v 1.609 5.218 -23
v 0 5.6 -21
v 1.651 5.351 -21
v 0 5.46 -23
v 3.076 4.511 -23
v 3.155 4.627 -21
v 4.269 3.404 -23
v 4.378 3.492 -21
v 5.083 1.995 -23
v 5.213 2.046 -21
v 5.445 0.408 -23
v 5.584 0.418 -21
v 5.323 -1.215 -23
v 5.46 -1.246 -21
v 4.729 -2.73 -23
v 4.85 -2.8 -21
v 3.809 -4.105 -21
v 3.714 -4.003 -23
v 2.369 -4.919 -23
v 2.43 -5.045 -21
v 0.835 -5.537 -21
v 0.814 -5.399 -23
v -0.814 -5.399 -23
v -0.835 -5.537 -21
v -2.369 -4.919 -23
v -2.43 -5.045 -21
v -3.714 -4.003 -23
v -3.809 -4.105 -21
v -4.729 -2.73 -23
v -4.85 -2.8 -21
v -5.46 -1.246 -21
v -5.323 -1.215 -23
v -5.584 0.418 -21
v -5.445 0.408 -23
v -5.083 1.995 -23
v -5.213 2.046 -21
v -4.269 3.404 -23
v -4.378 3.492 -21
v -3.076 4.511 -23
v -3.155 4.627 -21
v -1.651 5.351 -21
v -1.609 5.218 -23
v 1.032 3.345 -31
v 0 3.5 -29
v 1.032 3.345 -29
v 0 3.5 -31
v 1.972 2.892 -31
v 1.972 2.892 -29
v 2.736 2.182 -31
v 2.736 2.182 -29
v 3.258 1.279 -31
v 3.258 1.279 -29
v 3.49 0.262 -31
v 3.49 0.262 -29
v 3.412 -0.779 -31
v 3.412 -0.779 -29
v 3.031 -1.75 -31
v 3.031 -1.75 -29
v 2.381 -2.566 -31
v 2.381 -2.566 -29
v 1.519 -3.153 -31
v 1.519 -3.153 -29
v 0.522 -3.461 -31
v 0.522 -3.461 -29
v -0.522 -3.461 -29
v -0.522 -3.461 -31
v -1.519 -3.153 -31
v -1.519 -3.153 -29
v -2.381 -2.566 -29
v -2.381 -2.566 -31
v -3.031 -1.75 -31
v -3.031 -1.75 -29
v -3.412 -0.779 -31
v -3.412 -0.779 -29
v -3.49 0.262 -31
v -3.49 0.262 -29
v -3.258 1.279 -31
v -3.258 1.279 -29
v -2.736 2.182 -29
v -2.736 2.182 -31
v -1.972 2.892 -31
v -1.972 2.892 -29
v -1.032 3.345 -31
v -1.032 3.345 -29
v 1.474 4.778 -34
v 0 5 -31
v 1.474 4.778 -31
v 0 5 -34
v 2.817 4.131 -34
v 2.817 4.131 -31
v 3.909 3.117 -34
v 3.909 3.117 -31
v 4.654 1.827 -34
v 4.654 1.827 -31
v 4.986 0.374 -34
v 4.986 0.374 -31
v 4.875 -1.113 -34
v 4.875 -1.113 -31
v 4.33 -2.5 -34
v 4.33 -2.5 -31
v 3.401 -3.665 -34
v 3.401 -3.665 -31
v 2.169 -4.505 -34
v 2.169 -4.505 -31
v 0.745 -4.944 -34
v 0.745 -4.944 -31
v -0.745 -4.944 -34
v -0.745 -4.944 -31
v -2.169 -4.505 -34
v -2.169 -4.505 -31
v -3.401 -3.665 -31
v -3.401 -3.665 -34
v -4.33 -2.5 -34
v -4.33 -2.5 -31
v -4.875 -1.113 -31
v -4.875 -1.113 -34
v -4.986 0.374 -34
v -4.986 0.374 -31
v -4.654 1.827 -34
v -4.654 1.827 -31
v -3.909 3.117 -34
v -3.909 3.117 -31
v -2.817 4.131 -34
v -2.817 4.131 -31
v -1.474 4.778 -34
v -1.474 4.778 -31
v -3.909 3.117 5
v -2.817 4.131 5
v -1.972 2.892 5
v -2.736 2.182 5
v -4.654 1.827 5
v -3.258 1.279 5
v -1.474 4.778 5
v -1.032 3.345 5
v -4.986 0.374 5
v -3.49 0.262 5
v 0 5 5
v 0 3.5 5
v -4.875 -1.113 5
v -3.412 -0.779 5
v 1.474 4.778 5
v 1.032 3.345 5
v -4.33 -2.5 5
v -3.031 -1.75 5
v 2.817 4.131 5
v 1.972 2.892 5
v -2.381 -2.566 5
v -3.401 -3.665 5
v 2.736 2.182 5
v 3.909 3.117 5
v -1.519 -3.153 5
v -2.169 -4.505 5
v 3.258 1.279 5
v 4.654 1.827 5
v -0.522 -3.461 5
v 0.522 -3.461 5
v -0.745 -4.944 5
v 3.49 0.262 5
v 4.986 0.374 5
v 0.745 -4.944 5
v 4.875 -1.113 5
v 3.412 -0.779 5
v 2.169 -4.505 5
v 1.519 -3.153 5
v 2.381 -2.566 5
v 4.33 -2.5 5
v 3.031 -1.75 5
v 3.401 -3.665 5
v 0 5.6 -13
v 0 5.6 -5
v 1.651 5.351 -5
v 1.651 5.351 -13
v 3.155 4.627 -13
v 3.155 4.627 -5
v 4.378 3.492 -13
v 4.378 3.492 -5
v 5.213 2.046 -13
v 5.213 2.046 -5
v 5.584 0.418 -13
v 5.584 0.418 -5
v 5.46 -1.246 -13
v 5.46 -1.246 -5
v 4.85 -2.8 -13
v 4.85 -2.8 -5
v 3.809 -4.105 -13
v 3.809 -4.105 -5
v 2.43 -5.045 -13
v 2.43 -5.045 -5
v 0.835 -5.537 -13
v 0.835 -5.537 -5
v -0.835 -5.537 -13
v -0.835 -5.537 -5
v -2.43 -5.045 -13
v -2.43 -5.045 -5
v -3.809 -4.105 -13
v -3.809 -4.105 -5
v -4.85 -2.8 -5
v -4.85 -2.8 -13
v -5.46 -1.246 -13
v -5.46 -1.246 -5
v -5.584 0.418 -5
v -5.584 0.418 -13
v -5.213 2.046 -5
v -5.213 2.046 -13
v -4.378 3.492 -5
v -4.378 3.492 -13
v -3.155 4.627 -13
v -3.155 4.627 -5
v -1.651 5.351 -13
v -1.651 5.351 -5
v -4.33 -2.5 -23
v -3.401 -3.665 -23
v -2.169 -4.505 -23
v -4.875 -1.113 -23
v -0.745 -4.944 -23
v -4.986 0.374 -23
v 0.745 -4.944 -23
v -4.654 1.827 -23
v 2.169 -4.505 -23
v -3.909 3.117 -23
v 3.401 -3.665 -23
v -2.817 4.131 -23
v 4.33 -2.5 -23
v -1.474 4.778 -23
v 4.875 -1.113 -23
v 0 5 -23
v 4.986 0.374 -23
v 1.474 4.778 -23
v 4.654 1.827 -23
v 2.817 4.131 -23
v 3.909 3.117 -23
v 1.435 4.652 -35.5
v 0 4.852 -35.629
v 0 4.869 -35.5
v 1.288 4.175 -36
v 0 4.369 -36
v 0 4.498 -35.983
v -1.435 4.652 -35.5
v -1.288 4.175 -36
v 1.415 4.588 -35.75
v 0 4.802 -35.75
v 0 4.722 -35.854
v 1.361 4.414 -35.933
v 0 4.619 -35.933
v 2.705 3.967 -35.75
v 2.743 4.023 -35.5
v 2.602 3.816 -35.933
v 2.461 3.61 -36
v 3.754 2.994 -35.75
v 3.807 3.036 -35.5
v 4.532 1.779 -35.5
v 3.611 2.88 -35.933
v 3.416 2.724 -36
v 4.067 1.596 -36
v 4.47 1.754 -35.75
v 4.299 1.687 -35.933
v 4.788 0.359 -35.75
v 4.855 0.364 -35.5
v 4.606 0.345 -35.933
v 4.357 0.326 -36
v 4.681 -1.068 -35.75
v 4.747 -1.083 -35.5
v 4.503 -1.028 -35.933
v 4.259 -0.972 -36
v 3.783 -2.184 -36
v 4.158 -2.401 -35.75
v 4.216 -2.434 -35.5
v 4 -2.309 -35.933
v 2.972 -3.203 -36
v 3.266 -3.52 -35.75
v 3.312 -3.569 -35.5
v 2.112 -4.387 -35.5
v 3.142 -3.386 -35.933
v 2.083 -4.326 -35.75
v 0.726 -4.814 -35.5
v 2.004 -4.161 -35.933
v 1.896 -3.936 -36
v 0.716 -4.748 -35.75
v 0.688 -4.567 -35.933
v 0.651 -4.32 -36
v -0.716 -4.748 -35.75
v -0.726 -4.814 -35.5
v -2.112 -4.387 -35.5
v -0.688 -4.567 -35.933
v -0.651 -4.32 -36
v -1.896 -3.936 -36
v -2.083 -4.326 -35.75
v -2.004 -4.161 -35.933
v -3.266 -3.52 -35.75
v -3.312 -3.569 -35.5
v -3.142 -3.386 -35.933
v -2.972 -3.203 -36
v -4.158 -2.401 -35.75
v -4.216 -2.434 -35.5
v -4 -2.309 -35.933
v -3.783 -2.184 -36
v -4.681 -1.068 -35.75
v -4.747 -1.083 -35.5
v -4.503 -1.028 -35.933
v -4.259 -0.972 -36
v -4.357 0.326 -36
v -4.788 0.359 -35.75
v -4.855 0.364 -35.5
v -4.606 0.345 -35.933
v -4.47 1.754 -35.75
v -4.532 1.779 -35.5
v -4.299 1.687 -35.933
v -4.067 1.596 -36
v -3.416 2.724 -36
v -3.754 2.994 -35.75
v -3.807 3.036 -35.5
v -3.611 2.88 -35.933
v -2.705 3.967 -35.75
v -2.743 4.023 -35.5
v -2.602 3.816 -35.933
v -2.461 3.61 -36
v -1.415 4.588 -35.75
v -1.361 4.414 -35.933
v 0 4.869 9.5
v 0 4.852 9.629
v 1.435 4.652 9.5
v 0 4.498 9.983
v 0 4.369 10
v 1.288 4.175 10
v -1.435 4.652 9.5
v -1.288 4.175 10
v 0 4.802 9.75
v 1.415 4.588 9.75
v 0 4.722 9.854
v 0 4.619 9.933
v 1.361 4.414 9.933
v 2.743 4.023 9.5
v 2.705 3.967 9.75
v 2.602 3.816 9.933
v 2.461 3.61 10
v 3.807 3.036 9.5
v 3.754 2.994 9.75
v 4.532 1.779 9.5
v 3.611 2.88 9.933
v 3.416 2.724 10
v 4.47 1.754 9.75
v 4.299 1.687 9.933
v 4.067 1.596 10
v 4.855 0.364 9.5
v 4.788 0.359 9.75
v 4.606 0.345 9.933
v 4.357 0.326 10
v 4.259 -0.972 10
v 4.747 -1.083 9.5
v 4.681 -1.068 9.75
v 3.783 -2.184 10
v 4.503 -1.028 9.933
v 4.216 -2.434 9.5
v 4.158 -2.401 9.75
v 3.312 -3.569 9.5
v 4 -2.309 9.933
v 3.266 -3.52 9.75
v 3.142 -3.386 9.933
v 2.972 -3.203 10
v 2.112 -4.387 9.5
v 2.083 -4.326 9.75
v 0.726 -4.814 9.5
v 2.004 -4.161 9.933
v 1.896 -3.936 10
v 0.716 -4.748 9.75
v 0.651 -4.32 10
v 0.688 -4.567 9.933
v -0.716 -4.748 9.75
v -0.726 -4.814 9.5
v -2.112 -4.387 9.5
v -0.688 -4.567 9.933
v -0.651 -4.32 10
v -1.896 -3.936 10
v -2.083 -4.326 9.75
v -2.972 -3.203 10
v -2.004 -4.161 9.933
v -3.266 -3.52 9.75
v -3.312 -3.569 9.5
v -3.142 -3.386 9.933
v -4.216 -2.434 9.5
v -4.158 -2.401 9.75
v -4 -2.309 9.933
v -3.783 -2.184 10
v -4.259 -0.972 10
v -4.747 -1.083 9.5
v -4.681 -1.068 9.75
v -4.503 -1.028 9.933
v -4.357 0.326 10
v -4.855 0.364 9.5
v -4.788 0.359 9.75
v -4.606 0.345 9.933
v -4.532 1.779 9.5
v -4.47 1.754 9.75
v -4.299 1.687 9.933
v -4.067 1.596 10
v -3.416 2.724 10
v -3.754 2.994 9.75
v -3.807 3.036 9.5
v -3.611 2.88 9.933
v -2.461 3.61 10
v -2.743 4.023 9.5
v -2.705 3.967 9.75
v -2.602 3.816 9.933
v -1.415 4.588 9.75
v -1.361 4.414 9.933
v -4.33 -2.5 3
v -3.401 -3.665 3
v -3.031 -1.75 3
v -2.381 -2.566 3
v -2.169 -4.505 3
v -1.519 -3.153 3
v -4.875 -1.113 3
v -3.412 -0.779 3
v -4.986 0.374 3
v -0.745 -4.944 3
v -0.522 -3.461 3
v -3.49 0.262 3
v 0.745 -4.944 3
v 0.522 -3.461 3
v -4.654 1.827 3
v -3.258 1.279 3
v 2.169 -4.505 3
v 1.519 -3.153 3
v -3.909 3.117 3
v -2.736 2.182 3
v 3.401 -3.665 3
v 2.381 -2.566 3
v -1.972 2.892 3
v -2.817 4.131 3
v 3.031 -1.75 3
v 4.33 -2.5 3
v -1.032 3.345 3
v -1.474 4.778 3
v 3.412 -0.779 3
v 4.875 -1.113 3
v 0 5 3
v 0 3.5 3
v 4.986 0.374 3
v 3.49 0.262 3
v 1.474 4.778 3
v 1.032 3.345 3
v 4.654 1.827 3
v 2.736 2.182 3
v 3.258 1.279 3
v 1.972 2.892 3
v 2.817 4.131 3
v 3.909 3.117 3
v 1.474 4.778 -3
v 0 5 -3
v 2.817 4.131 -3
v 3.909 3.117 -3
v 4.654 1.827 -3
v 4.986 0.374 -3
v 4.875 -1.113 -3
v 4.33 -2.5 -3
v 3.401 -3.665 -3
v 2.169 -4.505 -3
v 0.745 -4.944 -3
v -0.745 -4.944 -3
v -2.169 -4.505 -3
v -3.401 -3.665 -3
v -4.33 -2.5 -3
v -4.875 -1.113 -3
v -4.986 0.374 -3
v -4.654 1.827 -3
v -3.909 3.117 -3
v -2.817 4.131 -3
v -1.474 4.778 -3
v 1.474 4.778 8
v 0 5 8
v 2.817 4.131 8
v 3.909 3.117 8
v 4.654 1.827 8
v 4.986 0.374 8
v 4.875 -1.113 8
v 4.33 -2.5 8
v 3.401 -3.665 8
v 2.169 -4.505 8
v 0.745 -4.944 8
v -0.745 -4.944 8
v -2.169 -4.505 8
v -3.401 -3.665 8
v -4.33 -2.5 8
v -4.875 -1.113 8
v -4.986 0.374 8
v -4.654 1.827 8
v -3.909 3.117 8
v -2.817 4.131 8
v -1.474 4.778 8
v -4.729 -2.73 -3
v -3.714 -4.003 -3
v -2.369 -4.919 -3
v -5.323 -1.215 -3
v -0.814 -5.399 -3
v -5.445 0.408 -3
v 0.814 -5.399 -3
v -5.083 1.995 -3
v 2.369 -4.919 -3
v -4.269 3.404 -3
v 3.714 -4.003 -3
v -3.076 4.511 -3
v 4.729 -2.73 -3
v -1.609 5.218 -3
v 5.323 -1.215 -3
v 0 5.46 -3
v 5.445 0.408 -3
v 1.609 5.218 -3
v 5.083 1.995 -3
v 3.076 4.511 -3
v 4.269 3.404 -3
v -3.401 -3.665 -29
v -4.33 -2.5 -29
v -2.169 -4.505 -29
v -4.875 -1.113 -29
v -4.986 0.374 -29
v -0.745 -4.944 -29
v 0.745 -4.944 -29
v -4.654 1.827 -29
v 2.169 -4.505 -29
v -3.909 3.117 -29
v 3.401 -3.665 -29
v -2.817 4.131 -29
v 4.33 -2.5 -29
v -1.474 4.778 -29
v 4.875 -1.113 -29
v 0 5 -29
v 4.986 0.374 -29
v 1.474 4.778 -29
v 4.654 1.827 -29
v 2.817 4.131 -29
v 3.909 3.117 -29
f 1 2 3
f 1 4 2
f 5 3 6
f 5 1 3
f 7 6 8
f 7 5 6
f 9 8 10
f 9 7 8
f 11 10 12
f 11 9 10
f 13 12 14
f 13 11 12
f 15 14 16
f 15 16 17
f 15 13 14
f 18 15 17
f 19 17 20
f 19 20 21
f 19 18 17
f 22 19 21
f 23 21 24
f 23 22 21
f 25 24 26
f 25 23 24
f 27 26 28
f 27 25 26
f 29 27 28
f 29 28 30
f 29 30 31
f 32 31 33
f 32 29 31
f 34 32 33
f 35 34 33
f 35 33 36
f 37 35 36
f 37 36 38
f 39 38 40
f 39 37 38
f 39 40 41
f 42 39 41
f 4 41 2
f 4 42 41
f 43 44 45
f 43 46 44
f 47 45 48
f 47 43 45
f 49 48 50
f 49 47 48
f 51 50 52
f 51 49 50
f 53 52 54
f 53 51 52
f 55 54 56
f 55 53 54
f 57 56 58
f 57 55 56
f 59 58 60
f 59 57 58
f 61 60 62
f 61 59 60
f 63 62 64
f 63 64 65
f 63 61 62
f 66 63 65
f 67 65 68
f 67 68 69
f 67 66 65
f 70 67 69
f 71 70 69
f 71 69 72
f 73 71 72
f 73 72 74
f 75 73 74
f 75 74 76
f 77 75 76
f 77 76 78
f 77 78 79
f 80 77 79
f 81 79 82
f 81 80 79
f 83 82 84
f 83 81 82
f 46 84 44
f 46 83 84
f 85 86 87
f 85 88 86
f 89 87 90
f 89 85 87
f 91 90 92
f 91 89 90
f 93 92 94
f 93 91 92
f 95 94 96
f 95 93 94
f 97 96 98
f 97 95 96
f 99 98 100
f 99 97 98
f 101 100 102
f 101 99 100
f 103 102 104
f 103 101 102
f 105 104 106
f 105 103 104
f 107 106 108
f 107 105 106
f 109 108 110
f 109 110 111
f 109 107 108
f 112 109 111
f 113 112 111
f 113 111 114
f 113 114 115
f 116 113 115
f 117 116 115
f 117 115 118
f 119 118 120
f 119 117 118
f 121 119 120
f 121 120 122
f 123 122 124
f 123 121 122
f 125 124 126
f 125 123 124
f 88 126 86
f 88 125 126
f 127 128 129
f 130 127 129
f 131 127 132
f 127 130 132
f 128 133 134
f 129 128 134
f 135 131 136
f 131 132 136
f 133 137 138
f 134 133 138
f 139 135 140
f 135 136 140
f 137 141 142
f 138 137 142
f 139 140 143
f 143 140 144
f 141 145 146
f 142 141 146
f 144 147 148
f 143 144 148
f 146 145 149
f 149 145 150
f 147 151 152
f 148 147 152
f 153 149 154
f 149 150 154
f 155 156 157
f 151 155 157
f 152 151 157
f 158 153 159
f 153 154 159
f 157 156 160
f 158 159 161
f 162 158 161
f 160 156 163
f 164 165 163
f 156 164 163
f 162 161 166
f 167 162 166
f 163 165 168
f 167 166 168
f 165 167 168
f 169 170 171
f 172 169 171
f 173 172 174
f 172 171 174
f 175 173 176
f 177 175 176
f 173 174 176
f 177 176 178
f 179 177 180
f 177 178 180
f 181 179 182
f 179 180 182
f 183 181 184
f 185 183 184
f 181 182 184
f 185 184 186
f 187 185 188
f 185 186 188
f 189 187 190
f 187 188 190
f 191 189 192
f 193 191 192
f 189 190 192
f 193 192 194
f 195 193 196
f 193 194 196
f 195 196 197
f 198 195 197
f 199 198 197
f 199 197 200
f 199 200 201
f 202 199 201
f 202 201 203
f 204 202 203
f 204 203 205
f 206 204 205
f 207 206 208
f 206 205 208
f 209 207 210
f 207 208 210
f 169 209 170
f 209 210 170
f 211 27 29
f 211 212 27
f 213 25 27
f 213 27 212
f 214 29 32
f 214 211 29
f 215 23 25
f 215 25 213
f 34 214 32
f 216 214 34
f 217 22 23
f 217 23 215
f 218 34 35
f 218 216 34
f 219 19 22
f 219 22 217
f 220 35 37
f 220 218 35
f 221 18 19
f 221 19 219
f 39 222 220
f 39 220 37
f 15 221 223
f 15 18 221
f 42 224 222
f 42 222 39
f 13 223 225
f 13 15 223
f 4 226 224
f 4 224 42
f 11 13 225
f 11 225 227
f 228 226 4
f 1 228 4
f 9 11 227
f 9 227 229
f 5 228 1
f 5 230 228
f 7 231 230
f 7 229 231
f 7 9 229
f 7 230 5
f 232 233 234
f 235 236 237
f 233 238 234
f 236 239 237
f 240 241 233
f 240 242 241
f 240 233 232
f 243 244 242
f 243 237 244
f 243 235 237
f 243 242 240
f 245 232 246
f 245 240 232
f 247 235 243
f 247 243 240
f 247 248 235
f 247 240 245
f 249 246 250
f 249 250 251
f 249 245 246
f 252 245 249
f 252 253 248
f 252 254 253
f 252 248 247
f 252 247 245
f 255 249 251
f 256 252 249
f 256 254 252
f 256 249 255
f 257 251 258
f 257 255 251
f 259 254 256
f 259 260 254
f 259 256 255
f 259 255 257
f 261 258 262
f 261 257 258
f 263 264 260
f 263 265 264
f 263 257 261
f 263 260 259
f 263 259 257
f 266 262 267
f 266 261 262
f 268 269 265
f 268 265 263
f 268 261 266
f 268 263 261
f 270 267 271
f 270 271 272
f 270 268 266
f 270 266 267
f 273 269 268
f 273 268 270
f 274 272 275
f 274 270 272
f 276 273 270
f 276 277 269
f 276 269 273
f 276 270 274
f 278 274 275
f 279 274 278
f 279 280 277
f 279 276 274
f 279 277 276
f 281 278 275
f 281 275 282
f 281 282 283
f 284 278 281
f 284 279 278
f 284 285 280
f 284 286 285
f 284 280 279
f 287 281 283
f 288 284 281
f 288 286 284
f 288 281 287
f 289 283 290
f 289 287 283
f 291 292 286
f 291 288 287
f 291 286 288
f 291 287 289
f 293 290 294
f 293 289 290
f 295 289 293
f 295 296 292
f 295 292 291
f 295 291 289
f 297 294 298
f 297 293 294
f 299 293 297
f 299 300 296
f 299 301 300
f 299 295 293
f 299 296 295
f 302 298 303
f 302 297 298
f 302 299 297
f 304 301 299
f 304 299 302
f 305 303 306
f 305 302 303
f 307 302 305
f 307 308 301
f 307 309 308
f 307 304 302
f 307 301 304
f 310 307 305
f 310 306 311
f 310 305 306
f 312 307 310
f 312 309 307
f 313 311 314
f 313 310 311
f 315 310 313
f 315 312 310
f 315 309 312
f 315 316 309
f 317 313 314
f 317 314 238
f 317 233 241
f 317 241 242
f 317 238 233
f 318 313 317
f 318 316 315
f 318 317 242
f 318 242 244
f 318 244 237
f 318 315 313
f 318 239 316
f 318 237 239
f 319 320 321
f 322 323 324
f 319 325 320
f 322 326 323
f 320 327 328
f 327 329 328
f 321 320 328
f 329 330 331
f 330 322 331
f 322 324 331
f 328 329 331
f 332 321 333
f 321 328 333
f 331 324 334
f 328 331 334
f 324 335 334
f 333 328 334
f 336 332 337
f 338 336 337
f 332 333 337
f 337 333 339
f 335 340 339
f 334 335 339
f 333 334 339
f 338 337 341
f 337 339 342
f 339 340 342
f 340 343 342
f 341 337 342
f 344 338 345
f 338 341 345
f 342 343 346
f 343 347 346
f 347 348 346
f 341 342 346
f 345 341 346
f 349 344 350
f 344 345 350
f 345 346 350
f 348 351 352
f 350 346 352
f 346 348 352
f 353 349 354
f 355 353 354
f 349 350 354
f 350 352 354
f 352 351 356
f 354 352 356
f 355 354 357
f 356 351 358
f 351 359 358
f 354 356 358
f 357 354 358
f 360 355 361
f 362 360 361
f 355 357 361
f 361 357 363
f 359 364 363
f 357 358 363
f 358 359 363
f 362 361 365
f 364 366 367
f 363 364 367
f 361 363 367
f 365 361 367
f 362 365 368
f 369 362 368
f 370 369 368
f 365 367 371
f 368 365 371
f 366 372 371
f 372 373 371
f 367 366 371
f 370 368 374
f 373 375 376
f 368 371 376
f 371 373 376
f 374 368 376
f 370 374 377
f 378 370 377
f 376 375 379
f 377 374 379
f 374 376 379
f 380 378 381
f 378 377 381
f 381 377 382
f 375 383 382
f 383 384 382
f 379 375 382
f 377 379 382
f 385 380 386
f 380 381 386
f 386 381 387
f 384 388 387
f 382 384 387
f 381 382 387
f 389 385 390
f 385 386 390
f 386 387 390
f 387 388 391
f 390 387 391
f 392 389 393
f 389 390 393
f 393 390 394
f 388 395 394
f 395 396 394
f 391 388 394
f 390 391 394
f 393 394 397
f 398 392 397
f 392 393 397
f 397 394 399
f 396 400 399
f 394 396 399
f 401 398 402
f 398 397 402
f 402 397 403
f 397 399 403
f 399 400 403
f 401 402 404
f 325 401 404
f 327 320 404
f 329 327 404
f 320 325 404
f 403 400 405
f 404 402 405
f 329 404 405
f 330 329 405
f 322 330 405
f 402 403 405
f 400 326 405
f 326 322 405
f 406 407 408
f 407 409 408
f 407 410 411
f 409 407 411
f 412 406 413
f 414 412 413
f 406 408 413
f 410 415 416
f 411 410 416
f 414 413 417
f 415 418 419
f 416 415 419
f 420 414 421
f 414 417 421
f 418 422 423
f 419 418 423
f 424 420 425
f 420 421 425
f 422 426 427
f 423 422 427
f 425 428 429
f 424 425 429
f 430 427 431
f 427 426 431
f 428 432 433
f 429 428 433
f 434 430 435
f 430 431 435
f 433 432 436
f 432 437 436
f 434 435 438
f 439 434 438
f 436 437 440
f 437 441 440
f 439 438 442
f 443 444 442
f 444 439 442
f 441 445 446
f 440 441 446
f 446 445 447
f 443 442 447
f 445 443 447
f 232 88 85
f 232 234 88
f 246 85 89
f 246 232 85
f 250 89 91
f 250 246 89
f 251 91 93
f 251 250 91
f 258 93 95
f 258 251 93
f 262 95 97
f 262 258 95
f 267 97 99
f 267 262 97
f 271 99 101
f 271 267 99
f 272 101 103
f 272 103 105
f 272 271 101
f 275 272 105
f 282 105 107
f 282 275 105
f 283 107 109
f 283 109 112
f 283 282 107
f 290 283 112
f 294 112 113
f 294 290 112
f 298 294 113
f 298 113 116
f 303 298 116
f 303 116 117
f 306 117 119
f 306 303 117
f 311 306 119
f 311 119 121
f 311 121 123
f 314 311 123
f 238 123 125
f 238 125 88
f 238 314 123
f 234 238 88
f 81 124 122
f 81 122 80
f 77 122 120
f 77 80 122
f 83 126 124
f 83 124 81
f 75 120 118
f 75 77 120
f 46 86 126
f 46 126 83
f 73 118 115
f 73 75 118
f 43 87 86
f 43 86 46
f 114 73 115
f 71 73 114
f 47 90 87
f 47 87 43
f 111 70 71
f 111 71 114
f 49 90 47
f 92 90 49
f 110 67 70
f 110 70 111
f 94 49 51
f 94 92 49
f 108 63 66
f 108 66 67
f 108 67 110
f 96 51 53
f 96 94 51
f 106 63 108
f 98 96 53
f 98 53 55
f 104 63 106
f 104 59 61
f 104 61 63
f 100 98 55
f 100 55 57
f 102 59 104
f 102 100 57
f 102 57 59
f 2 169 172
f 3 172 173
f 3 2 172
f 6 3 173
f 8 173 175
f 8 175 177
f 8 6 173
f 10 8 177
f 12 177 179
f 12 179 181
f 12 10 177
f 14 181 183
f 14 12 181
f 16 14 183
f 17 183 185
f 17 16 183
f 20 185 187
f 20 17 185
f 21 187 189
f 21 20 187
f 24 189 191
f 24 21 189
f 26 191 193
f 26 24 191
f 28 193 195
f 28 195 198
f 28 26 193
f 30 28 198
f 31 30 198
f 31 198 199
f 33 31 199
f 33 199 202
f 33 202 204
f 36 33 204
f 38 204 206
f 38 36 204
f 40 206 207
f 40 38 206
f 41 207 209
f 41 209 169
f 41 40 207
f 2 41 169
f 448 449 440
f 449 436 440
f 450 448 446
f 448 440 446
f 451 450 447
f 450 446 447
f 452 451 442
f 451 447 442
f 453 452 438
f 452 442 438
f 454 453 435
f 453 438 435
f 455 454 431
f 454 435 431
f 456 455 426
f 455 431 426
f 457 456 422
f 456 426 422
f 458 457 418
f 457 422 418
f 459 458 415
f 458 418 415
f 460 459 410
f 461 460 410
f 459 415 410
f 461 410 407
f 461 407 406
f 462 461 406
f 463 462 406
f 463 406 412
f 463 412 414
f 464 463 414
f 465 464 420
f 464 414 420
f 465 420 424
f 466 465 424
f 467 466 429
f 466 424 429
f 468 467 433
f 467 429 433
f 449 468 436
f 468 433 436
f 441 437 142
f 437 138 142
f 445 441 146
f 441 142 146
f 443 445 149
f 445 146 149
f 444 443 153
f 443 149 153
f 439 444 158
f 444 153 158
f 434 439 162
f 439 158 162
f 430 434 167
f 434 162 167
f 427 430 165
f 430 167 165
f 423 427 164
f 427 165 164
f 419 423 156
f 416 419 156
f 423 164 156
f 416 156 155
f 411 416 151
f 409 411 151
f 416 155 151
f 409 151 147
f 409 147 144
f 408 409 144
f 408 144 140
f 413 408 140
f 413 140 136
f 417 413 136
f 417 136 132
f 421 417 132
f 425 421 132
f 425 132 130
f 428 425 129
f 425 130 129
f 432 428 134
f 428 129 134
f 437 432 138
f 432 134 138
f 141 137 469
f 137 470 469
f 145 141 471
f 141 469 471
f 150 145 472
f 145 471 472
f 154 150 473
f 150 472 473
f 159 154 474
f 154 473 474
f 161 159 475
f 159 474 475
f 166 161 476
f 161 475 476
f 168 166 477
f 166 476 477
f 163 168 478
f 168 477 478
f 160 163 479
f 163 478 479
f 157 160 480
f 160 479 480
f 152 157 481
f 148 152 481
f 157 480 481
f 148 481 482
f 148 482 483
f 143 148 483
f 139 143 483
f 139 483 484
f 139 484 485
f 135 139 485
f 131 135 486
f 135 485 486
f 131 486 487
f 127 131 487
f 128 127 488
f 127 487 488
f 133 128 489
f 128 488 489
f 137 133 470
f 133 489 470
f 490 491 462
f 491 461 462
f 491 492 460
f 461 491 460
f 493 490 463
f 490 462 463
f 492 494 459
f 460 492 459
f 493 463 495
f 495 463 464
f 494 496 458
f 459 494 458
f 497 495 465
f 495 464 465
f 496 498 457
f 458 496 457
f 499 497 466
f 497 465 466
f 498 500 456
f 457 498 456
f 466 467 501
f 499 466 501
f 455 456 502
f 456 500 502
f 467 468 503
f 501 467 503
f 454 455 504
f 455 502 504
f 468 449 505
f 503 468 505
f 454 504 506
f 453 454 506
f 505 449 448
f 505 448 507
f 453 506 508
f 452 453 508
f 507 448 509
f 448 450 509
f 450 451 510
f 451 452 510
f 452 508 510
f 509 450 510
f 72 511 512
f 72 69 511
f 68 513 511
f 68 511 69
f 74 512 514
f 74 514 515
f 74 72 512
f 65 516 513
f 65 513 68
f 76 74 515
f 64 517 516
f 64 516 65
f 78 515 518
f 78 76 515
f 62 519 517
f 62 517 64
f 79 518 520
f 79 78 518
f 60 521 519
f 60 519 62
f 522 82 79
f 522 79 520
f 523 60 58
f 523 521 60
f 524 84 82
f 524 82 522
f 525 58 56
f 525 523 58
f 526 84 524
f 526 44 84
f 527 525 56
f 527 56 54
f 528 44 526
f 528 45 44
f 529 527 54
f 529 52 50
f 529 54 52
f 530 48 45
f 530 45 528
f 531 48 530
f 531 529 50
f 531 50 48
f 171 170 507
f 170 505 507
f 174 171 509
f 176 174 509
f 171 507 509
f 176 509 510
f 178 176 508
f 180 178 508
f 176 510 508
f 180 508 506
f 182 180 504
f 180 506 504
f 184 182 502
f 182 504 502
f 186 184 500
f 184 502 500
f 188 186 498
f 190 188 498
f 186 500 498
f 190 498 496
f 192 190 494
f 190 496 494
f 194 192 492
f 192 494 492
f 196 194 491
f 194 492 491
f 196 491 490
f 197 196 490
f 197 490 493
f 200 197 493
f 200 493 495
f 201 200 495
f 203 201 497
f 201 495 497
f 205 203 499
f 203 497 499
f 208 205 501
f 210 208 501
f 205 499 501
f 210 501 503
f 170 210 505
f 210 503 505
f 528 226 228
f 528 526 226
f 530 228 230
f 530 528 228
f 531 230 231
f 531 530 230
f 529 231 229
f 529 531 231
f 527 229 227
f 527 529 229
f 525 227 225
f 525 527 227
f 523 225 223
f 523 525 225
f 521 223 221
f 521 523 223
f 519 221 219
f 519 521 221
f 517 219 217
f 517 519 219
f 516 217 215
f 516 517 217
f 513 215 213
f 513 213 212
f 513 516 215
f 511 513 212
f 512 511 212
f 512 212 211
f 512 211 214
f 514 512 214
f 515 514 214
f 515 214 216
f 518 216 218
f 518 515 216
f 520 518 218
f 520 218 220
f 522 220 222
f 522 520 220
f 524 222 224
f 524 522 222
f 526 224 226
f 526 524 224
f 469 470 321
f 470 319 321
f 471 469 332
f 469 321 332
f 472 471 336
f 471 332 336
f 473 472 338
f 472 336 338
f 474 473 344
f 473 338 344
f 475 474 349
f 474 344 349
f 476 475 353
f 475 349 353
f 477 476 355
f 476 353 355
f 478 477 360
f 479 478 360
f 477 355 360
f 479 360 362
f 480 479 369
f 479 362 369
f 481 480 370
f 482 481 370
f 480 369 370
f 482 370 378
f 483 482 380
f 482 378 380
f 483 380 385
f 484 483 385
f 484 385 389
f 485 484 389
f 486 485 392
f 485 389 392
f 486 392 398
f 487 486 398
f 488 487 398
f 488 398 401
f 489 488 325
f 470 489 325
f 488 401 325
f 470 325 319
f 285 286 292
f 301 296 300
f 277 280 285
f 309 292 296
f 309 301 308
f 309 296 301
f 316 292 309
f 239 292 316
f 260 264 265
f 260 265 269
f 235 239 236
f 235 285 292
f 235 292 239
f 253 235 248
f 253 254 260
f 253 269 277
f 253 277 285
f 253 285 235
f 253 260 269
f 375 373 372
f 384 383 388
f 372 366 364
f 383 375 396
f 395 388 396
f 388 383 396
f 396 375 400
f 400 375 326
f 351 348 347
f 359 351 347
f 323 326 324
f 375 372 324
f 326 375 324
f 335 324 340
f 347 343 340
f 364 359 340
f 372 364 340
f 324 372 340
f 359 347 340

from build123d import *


with BuildPart() as part:
    # Sketch1 → Revolve1 (revolve)
    with BuildSketch(Plane(origin=(0, 0, 0), x_dir=(0, 0, -1), z_dir=(1, 0, 0))):
        with BuildLine():
            Line((-10, 0), (-3, 0))
            Line((-3, 0), (13, 0))
            Line((13, 0), (13, 5.6))
            Line((13, 5.6), (5, 5.6))
            Line((5, 5.6), (3, 5.460146376))
            Line((3, 5.460146376), (3, 5))
            Line((3, 5), (-3, 5))
            Line((-3, 5), (-3, 3.5))
            Line((-3, 3.5), (-5, 3.5))
            Line((-5, 3.5), (-5, 5))
            Line((-5, 5), (-8, 5))
            Line((-8, 5), (-9.5, 4.868767005))
            ThreePointArc((-9.5, 4.868767005), (-9.853553391, 4.722320395), (-10, 4.368767005))
            Line((-10, 4.368767005), (-10, 0))
        make_face()
    revolve1 = revolve(axis=Axis((0, 0, 3), (0, 0, -1)))

    # Mirror1: Revolve1 across plane
    add(revolve1.mirror(Plane(origin=(0, 0, -13), x_dir=(1, 0, 0), z_dir=(0, 0, -1))))


solid = part.part
